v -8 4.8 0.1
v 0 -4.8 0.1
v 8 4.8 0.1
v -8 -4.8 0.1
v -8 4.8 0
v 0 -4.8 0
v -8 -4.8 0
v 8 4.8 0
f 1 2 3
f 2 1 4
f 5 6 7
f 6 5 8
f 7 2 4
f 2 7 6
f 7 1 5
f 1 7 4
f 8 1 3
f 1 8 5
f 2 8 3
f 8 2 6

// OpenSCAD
// file: 164575b.scad
use <../lib.scad>
function ldraw_lib__164575b() = [
// 0 Sticker Train Front  2 x  6 Stripe Right
// 0 Name: 164575b.dat
// 0 Author: William Howard [WilliamH]
// 0 !LDRAW_ORG Part UPDATE 2014-02
// 0 !LICENSE Licensed under CC BY 2.0 and CC BY 4.0 : see CAreadme.txt
// 
// 0 BFC CERTIFY CCW
  [0,"BFC","CERTIFY"],
  [0,"BFC","CCW"],
// 
// 0 !HISTORY 2013-08-08 [MMR1988] Inlined Subpart and corrected dimensions
// 0 !HISTORY 2014-12-23 [PTadmin] Official Update 2014-02
// 
// 
// 4 15 -20 -0.25 -12 0 -0.25 -12 20 -0.25 12 -20 -0.25 12
  [4,15,-20,-0.25,-12,0,-0.25,-12,20,-0.25,12,-20,-0.25,12],
// 4 16 -20 0 12 20 0 12 0 0 -12 -20 0 -12
  [4,16,-20,0,12,20,0,12,0,0,-12,-20,0,-12],
// 4 16 -20 0 -12 0 0 -12 0 -0.25 -12 -20 -0.25 -12
  [4,16,-20,0,-12,0,0,-12,0,-0.25,-12,-20,-0.25,-12],
// 4 16 -20 0 12 -20 0 -12 -20 -0.25 -12 -20 -0.25 12
  [4,16,-20,0,12,-20,0,-12,-20,-0.25,-12,-20,-0.25,12],
// 4 16 -20 -0.25 12 20 -0.25 12 20 0 12 -20 0 12
  [4,16,-20,-0.25,12,20,-0.25,12,20,0,12,-20,0,12],
// 4 16 20 -0.25 12 0 -0.25 -12 0 0 -12 20 0 12
  [4,16,20,-0.25,12,0,-0.25,-12,0,0,-12,20,0,12],
];
module ldraw_lib__164575b(step=0, col=false, unit=2/5, alt=false, line=0.2, solid=!$preview)
    makepoly(ldraw_lib__164575b(), step=step, col=col, unit=unit, alt=alt, line=line, solid=solid);
ldraw_lib__164575b(line=0.2);
// main file
use <../lib.scad>
use <164575b.scad>
function ldraw_lib__164585a() = [
// 0 =Sticker Train Front  2 x  6 White Stripe Right
// 0 Name: 164585a.dat
// 0 Author: Gerald Lasser [GeraldLasser]
// 0 !LDRAW_ORG Part Alias UPDATE 2023-01
// 0 !LICENSE Licensed under CC BY 2.0 and CC BY 4.0 : see CAreadme.txt
// 
// 0 BFC CERTIFY CCW
  [0,"BFC","CERTIFY"],
  [0,"BFC","CCW"],
// 
// 0 !KEYWORDS Set 4536, Set 4543, Set 4546, set 4551
// 
// 0 !HISTORY 2023-03-05 [OrionP] Official Update 2023-01
// 
// 
// 1 16 0 0 0 1 0 0 0 1 0 0 0 1 164575b.dat
  [1,16,0,0,0,1,0,0,0,1,0,0,0,1, ldraw_lib__164575b()],
];
module ldraw_lib__164585a(step=0, col=false, unit=2/5, alt=false, line=0.2, solid=!$preview)
    makepoly(ldraw_lib__164585a(), step=step, col=col, unit=unit, alt=alt, line=line, solid=solid);
ldraw_lib__164585a(line=0.2);
